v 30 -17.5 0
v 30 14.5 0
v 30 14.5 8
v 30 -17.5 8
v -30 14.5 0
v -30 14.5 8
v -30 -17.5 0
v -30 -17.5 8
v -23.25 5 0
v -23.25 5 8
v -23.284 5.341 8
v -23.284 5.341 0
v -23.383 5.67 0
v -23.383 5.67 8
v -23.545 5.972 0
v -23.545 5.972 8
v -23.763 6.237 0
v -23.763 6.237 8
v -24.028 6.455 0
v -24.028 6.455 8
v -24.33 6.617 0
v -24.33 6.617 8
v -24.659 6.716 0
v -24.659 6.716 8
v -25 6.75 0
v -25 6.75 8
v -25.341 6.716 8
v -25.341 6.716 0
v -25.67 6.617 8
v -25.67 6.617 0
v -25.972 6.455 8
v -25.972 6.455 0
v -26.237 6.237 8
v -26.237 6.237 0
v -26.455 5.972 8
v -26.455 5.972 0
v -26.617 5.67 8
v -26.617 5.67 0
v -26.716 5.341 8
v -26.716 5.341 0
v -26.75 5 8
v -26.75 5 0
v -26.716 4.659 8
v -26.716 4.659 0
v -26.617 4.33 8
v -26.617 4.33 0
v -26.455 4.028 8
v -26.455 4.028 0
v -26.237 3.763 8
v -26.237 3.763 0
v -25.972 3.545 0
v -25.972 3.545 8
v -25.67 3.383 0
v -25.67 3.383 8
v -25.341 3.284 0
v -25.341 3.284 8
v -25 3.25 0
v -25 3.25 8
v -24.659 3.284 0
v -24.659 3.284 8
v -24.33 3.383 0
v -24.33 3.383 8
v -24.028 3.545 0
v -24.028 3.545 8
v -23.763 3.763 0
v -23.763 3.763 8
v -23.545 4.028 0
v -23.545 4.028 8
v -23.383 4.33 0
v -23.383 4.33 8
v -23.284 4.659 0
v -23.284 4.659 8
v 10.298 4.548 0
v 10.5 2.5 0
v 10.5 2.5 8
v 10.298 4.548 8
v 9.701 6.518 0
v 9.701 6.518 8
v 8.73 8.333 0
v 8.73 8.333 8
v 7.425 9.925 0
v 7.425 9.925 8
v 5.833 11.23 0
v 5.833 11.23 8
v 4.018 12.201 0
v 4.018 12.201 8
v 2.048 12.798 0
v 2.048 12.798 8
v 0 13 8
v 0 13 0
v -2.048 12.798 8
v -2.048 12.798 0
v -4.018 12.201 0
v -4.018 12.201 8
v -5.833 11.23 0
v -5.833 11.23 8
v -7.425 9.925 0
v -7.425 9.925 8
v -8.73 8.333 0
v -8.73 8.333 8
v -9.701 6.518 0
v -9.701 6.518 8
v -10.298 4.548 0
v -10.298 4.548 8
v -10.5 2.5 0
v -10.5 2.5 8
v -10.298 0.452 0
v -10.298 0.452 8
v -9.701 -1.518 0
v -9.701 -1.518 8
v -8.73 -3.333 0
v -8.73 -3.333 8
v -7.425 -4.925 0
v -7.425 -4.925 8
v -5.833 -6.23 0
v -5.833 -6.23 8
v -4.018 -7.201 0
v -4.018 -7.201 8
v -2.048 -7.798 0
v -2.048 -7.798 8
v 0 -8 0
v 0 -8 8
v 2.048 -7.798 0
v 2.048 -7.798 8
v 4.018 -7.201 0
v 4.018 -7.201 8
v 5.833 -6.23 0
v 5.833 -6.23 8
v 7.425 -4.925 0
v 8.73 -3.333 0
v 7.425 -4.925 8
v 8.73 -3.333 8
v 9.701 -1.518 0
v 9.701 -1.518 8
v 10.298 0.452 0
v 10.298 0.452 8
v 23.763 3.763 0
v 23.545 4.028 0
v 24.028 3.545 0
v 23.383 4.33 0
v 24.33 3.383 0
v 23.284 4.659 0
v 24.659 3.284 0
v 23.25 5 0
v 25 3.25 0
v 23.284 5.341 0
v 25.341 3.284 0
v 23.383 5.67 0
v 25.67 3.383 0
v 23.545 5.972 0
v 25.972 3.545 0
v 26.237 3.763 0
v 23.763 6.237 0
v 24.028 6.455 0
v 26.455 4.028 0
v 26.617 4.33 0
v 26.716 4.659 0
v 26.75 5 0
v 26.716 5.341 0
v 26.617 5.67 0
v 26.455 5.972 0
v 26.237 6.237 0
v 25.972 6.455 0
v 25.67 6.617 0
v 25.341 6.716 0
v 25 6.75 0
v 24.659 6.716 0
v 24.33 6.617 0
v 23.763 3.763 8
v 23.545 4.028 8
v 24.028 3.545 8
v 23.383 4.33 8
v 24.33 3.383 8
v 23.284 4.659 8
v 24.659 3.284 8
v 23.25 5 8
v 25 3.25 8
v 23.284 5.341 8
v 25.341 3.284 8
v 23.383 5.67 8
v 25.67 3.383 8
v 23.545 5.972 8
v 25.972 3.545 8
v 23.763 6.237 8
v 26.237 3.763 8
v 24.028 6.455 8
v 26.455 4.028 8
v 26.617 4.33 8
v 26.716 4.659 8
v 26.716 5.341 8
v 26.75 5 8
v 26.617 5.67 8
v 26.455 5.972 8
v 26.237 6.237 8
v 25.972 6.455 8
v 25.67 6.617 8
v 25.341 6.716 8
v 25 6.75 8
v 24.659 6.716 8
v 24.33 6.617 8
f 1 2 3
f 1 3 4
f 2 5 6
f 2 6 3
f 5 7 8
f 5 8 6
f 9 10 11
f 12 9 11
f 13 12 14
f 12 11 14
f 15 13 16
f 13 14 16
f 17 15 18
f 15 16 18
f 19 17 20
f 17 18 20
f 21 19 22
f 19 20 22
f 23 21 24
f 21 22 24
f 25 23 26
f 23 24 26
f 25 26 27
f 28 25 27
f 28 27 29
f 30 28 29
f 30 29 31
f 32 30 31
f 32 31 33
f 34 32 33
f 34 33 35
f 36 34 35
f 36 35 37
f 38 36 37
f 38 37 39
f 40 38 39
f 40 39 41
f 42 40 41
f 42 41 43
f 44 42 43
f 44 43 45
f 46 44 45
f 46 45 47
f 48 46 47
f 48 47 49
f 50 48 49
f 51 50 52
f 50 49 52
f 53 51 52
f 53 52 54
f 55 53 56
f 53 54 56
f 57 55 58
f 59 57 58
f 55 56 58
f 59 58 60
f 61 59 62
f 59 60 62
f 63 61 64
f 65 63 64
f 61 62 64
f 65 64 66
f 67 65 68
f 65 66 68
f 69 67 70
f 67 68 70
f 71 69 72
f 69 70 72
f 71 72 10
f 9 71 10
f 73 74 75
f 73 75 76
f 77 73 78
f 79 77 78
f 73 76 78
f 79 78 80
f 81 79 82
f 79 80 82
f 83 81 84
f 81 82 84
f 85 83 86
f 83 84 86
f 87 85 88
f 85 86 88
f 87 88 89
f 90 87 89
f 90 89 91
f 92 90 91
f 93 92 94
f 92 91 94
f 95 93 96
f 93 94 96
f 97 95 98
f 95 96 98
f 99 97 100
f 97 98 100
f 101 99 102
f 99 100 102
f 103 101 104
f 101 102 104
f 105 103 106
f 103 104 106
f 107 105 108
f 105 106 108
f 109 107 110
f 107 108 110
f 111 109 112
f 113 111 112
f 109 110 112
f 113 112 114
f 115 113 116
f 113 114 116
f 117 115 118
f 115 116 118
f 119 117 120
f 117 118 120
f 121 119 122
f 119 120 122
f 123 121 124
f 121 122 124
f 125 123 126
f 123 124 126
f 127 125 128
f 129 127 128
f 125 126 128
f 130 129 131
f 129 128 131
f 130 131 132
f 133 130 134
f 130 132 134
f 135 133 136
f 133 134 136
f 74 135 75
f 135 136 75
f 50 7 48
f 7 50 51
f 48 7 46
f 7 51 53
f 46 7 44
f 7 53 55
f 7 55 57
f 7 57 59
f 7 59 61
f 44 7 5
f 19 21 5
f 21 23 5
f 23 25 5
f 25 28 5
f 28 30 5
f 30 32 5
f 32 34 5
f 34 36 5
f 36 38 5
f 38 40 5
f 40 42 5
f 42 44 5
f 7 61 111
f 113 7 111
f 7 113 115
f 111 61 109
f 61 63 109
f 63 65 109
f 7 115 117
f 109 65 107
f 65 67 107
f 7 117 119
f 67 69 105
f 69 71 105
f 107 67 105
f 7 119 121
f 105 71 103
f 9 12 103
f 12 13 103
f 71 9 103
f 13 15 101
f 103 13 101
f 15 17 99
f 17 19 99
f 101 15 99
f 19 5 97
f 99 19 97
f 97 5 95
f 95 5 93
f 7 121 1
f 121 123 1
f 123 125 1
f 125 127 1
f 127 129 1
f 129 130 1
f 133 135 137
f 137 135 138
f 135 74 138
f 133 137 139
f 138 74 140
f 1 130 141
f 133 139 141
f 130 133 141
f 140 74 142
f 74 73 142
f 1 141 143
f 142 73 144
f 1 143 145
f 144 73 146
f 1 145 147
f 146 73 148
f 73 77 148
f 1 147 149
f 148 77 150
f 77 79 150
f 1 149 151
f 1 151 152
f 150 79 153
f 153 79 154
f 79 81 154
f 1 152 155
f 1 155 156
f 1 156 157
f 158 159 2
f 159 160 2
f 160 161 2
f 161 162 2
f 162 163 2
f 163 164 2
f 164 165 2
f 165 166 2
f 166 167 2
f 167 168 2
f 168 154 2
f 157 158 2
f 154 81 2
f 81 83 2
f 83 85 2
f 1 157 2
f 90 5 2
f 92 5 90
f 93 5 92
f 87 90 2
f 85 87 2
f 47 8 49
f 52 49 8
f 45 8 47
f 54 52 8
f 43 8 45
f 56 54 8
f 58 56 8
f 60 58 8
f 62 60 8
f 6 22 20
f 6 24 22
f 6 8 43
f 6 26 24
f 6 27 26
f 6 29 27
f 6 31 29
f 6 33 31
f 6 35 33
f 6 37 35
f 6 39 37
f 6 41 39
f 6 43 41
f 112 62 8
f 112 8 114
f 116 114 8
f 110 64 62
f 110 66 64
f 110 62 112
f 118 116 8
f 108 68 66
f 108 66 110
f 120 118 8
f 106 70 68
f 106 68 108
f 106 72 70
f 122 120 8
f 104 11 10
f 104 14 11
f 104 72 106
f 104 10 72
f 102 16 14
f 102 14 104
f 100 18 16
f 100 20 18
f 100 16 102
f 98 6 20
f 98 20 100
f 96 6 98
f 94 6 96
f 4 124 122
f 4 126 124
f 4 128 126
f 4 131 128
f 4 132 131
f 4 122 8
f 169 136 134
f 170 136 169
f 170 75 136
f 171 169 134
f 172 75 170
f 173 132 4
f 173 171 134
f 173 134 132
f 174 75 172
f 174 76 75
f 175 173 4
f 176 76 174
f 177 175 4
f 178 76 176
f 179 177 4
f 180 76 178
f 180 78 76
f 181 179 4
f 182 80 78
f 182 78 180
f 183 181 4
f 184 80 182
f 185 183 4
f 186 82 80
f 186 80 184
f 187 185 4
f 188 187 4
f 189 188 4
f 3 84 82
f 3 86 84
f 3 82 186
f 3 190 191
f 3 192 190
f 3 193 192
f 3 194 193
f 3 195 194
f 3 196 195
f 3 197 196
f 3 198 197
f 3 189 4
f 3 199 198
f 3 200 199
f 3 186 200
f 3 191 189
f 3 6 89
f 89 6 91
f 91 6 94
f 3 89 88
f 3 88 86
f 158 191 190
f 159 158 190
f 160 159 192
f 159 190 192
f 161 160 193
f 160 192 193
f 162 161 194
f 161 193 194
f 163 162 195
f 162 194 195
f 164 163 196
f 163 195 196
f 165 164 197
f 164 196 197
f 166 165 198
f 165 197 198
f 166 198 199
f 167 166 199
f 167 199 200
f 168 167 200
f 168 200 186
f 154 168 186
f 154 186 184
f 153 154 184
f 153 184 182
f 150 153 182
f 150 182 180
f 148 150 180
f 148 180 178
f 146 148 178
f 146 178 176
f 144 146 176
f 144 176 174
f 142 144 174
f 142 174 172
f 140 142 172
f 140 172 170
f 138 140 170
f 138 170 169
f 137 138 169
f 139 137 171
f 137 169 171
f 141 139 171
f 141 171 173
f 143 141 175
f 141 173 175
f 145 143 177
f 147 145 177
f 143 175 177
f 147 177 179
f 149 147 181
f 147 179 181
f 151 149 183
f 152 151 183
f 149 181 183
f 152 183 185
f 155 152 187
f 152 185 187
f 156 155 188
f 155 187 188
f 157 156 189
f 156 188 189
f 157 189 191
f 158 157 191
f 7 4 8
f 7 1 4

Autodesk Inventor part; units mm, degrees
ref_plane "YZ Plane" through (0, 0, 0) normal (1, 0, 0) x (0, 1, 0)
ref_plane "XZ Plane" through (0, 0, 0) normal (0, 1, 0) x (-1, 0, 0)
ref_plane "XY Plane" through (0, 0, 0) normal (0, 0, 1) x (1, 0, 0)
sketch "Sketch1" plane through (0, 0, 0) normal (0, 0, 1) x (1, 0, 0)
  line L0 (-30, 17.5) -> (30, 17.5)
  line L1 (30, 17.5) -> (30, -17.5)
  line L2 (30, -17.5) -> (-30, -17.5)
  line L3 (-30, -17.5) -> (-30, 17.5)
  point P0 (0, 0)
  point P1 (0, 17.5)
  point P2 (-30, 0)
  dimension "d0" = 60
  dimension "d1" = 35
extrude "Extrusion1" add sketch "Sketch1" along normal blind 8
sketch "Sketch2" plane through (0, 0, 8) normal (0, 0, 1) x (1, 0, 0)
  line L0 (0, 5) -> (0, 0) construction
  line L1 (-10.5, 5) -> (-10.5, 0)
  line L2 (10.5, 0) -> (10.5, 5)
  arc A0 (10.5, 5) -> (-10.5, 5) centre (0, 5) ccw
  arc A1 (-10.5, 0) -> (10.5, 0) centre (0, 0) ccw
  line L3 (-30, -17.5) -> (30, -17.5) projected
  line L4 (30, 17.5) -> (-30, 17.5) projected
  circle A2 centre (0, 2.5) radius 10.5
  point P0 (0, 0)
  point P1 (0, 17.5)
  dimension "d4" = 5
  dimension "d5" = 21
  dimension "d17" = 21
  dimension "d18" = 15
extrude "Extrusion2" cut sketch "Sketch2" against normal through all contours A2
sketch "Sketch3" plane through (0, 0, 8) normal (0, 0, 1) x (1, 0, 0)
  circle A0 centre (25, 5) radius 1.75
  circle A1 centre (25, 15) radius 1.75
  line L0 (30, 17.5) -> (-30, 17.5) projected
  line L1 (30, -17.5) -> (30, 17.5) projected
  circle A2 centre (-25, 5) radius 1.75
  circle A3 centre (-25, 15) radius 1.75
  line L2 (-30, 17.5) -> (-30, -17.5) projected
  point P0 (0, 0)
  dimension "d9" = 3.5
  dimension "d10" = 3.5
  dimension "d11" = 10
  dimension "d12" = 2.5
  dimension "d13" = 5
  dimension "d14" = 5
extrude "Extrusion3" cut sketch "Sketch3" against normal through all contours A0 | A2
move faces "Move1" translate (0, -3, 0) faces at (10, 17.5, 2.6667)
equation "\"d14\" = d13"
properties part number "0005-10-002 Suport1 Seringa"
